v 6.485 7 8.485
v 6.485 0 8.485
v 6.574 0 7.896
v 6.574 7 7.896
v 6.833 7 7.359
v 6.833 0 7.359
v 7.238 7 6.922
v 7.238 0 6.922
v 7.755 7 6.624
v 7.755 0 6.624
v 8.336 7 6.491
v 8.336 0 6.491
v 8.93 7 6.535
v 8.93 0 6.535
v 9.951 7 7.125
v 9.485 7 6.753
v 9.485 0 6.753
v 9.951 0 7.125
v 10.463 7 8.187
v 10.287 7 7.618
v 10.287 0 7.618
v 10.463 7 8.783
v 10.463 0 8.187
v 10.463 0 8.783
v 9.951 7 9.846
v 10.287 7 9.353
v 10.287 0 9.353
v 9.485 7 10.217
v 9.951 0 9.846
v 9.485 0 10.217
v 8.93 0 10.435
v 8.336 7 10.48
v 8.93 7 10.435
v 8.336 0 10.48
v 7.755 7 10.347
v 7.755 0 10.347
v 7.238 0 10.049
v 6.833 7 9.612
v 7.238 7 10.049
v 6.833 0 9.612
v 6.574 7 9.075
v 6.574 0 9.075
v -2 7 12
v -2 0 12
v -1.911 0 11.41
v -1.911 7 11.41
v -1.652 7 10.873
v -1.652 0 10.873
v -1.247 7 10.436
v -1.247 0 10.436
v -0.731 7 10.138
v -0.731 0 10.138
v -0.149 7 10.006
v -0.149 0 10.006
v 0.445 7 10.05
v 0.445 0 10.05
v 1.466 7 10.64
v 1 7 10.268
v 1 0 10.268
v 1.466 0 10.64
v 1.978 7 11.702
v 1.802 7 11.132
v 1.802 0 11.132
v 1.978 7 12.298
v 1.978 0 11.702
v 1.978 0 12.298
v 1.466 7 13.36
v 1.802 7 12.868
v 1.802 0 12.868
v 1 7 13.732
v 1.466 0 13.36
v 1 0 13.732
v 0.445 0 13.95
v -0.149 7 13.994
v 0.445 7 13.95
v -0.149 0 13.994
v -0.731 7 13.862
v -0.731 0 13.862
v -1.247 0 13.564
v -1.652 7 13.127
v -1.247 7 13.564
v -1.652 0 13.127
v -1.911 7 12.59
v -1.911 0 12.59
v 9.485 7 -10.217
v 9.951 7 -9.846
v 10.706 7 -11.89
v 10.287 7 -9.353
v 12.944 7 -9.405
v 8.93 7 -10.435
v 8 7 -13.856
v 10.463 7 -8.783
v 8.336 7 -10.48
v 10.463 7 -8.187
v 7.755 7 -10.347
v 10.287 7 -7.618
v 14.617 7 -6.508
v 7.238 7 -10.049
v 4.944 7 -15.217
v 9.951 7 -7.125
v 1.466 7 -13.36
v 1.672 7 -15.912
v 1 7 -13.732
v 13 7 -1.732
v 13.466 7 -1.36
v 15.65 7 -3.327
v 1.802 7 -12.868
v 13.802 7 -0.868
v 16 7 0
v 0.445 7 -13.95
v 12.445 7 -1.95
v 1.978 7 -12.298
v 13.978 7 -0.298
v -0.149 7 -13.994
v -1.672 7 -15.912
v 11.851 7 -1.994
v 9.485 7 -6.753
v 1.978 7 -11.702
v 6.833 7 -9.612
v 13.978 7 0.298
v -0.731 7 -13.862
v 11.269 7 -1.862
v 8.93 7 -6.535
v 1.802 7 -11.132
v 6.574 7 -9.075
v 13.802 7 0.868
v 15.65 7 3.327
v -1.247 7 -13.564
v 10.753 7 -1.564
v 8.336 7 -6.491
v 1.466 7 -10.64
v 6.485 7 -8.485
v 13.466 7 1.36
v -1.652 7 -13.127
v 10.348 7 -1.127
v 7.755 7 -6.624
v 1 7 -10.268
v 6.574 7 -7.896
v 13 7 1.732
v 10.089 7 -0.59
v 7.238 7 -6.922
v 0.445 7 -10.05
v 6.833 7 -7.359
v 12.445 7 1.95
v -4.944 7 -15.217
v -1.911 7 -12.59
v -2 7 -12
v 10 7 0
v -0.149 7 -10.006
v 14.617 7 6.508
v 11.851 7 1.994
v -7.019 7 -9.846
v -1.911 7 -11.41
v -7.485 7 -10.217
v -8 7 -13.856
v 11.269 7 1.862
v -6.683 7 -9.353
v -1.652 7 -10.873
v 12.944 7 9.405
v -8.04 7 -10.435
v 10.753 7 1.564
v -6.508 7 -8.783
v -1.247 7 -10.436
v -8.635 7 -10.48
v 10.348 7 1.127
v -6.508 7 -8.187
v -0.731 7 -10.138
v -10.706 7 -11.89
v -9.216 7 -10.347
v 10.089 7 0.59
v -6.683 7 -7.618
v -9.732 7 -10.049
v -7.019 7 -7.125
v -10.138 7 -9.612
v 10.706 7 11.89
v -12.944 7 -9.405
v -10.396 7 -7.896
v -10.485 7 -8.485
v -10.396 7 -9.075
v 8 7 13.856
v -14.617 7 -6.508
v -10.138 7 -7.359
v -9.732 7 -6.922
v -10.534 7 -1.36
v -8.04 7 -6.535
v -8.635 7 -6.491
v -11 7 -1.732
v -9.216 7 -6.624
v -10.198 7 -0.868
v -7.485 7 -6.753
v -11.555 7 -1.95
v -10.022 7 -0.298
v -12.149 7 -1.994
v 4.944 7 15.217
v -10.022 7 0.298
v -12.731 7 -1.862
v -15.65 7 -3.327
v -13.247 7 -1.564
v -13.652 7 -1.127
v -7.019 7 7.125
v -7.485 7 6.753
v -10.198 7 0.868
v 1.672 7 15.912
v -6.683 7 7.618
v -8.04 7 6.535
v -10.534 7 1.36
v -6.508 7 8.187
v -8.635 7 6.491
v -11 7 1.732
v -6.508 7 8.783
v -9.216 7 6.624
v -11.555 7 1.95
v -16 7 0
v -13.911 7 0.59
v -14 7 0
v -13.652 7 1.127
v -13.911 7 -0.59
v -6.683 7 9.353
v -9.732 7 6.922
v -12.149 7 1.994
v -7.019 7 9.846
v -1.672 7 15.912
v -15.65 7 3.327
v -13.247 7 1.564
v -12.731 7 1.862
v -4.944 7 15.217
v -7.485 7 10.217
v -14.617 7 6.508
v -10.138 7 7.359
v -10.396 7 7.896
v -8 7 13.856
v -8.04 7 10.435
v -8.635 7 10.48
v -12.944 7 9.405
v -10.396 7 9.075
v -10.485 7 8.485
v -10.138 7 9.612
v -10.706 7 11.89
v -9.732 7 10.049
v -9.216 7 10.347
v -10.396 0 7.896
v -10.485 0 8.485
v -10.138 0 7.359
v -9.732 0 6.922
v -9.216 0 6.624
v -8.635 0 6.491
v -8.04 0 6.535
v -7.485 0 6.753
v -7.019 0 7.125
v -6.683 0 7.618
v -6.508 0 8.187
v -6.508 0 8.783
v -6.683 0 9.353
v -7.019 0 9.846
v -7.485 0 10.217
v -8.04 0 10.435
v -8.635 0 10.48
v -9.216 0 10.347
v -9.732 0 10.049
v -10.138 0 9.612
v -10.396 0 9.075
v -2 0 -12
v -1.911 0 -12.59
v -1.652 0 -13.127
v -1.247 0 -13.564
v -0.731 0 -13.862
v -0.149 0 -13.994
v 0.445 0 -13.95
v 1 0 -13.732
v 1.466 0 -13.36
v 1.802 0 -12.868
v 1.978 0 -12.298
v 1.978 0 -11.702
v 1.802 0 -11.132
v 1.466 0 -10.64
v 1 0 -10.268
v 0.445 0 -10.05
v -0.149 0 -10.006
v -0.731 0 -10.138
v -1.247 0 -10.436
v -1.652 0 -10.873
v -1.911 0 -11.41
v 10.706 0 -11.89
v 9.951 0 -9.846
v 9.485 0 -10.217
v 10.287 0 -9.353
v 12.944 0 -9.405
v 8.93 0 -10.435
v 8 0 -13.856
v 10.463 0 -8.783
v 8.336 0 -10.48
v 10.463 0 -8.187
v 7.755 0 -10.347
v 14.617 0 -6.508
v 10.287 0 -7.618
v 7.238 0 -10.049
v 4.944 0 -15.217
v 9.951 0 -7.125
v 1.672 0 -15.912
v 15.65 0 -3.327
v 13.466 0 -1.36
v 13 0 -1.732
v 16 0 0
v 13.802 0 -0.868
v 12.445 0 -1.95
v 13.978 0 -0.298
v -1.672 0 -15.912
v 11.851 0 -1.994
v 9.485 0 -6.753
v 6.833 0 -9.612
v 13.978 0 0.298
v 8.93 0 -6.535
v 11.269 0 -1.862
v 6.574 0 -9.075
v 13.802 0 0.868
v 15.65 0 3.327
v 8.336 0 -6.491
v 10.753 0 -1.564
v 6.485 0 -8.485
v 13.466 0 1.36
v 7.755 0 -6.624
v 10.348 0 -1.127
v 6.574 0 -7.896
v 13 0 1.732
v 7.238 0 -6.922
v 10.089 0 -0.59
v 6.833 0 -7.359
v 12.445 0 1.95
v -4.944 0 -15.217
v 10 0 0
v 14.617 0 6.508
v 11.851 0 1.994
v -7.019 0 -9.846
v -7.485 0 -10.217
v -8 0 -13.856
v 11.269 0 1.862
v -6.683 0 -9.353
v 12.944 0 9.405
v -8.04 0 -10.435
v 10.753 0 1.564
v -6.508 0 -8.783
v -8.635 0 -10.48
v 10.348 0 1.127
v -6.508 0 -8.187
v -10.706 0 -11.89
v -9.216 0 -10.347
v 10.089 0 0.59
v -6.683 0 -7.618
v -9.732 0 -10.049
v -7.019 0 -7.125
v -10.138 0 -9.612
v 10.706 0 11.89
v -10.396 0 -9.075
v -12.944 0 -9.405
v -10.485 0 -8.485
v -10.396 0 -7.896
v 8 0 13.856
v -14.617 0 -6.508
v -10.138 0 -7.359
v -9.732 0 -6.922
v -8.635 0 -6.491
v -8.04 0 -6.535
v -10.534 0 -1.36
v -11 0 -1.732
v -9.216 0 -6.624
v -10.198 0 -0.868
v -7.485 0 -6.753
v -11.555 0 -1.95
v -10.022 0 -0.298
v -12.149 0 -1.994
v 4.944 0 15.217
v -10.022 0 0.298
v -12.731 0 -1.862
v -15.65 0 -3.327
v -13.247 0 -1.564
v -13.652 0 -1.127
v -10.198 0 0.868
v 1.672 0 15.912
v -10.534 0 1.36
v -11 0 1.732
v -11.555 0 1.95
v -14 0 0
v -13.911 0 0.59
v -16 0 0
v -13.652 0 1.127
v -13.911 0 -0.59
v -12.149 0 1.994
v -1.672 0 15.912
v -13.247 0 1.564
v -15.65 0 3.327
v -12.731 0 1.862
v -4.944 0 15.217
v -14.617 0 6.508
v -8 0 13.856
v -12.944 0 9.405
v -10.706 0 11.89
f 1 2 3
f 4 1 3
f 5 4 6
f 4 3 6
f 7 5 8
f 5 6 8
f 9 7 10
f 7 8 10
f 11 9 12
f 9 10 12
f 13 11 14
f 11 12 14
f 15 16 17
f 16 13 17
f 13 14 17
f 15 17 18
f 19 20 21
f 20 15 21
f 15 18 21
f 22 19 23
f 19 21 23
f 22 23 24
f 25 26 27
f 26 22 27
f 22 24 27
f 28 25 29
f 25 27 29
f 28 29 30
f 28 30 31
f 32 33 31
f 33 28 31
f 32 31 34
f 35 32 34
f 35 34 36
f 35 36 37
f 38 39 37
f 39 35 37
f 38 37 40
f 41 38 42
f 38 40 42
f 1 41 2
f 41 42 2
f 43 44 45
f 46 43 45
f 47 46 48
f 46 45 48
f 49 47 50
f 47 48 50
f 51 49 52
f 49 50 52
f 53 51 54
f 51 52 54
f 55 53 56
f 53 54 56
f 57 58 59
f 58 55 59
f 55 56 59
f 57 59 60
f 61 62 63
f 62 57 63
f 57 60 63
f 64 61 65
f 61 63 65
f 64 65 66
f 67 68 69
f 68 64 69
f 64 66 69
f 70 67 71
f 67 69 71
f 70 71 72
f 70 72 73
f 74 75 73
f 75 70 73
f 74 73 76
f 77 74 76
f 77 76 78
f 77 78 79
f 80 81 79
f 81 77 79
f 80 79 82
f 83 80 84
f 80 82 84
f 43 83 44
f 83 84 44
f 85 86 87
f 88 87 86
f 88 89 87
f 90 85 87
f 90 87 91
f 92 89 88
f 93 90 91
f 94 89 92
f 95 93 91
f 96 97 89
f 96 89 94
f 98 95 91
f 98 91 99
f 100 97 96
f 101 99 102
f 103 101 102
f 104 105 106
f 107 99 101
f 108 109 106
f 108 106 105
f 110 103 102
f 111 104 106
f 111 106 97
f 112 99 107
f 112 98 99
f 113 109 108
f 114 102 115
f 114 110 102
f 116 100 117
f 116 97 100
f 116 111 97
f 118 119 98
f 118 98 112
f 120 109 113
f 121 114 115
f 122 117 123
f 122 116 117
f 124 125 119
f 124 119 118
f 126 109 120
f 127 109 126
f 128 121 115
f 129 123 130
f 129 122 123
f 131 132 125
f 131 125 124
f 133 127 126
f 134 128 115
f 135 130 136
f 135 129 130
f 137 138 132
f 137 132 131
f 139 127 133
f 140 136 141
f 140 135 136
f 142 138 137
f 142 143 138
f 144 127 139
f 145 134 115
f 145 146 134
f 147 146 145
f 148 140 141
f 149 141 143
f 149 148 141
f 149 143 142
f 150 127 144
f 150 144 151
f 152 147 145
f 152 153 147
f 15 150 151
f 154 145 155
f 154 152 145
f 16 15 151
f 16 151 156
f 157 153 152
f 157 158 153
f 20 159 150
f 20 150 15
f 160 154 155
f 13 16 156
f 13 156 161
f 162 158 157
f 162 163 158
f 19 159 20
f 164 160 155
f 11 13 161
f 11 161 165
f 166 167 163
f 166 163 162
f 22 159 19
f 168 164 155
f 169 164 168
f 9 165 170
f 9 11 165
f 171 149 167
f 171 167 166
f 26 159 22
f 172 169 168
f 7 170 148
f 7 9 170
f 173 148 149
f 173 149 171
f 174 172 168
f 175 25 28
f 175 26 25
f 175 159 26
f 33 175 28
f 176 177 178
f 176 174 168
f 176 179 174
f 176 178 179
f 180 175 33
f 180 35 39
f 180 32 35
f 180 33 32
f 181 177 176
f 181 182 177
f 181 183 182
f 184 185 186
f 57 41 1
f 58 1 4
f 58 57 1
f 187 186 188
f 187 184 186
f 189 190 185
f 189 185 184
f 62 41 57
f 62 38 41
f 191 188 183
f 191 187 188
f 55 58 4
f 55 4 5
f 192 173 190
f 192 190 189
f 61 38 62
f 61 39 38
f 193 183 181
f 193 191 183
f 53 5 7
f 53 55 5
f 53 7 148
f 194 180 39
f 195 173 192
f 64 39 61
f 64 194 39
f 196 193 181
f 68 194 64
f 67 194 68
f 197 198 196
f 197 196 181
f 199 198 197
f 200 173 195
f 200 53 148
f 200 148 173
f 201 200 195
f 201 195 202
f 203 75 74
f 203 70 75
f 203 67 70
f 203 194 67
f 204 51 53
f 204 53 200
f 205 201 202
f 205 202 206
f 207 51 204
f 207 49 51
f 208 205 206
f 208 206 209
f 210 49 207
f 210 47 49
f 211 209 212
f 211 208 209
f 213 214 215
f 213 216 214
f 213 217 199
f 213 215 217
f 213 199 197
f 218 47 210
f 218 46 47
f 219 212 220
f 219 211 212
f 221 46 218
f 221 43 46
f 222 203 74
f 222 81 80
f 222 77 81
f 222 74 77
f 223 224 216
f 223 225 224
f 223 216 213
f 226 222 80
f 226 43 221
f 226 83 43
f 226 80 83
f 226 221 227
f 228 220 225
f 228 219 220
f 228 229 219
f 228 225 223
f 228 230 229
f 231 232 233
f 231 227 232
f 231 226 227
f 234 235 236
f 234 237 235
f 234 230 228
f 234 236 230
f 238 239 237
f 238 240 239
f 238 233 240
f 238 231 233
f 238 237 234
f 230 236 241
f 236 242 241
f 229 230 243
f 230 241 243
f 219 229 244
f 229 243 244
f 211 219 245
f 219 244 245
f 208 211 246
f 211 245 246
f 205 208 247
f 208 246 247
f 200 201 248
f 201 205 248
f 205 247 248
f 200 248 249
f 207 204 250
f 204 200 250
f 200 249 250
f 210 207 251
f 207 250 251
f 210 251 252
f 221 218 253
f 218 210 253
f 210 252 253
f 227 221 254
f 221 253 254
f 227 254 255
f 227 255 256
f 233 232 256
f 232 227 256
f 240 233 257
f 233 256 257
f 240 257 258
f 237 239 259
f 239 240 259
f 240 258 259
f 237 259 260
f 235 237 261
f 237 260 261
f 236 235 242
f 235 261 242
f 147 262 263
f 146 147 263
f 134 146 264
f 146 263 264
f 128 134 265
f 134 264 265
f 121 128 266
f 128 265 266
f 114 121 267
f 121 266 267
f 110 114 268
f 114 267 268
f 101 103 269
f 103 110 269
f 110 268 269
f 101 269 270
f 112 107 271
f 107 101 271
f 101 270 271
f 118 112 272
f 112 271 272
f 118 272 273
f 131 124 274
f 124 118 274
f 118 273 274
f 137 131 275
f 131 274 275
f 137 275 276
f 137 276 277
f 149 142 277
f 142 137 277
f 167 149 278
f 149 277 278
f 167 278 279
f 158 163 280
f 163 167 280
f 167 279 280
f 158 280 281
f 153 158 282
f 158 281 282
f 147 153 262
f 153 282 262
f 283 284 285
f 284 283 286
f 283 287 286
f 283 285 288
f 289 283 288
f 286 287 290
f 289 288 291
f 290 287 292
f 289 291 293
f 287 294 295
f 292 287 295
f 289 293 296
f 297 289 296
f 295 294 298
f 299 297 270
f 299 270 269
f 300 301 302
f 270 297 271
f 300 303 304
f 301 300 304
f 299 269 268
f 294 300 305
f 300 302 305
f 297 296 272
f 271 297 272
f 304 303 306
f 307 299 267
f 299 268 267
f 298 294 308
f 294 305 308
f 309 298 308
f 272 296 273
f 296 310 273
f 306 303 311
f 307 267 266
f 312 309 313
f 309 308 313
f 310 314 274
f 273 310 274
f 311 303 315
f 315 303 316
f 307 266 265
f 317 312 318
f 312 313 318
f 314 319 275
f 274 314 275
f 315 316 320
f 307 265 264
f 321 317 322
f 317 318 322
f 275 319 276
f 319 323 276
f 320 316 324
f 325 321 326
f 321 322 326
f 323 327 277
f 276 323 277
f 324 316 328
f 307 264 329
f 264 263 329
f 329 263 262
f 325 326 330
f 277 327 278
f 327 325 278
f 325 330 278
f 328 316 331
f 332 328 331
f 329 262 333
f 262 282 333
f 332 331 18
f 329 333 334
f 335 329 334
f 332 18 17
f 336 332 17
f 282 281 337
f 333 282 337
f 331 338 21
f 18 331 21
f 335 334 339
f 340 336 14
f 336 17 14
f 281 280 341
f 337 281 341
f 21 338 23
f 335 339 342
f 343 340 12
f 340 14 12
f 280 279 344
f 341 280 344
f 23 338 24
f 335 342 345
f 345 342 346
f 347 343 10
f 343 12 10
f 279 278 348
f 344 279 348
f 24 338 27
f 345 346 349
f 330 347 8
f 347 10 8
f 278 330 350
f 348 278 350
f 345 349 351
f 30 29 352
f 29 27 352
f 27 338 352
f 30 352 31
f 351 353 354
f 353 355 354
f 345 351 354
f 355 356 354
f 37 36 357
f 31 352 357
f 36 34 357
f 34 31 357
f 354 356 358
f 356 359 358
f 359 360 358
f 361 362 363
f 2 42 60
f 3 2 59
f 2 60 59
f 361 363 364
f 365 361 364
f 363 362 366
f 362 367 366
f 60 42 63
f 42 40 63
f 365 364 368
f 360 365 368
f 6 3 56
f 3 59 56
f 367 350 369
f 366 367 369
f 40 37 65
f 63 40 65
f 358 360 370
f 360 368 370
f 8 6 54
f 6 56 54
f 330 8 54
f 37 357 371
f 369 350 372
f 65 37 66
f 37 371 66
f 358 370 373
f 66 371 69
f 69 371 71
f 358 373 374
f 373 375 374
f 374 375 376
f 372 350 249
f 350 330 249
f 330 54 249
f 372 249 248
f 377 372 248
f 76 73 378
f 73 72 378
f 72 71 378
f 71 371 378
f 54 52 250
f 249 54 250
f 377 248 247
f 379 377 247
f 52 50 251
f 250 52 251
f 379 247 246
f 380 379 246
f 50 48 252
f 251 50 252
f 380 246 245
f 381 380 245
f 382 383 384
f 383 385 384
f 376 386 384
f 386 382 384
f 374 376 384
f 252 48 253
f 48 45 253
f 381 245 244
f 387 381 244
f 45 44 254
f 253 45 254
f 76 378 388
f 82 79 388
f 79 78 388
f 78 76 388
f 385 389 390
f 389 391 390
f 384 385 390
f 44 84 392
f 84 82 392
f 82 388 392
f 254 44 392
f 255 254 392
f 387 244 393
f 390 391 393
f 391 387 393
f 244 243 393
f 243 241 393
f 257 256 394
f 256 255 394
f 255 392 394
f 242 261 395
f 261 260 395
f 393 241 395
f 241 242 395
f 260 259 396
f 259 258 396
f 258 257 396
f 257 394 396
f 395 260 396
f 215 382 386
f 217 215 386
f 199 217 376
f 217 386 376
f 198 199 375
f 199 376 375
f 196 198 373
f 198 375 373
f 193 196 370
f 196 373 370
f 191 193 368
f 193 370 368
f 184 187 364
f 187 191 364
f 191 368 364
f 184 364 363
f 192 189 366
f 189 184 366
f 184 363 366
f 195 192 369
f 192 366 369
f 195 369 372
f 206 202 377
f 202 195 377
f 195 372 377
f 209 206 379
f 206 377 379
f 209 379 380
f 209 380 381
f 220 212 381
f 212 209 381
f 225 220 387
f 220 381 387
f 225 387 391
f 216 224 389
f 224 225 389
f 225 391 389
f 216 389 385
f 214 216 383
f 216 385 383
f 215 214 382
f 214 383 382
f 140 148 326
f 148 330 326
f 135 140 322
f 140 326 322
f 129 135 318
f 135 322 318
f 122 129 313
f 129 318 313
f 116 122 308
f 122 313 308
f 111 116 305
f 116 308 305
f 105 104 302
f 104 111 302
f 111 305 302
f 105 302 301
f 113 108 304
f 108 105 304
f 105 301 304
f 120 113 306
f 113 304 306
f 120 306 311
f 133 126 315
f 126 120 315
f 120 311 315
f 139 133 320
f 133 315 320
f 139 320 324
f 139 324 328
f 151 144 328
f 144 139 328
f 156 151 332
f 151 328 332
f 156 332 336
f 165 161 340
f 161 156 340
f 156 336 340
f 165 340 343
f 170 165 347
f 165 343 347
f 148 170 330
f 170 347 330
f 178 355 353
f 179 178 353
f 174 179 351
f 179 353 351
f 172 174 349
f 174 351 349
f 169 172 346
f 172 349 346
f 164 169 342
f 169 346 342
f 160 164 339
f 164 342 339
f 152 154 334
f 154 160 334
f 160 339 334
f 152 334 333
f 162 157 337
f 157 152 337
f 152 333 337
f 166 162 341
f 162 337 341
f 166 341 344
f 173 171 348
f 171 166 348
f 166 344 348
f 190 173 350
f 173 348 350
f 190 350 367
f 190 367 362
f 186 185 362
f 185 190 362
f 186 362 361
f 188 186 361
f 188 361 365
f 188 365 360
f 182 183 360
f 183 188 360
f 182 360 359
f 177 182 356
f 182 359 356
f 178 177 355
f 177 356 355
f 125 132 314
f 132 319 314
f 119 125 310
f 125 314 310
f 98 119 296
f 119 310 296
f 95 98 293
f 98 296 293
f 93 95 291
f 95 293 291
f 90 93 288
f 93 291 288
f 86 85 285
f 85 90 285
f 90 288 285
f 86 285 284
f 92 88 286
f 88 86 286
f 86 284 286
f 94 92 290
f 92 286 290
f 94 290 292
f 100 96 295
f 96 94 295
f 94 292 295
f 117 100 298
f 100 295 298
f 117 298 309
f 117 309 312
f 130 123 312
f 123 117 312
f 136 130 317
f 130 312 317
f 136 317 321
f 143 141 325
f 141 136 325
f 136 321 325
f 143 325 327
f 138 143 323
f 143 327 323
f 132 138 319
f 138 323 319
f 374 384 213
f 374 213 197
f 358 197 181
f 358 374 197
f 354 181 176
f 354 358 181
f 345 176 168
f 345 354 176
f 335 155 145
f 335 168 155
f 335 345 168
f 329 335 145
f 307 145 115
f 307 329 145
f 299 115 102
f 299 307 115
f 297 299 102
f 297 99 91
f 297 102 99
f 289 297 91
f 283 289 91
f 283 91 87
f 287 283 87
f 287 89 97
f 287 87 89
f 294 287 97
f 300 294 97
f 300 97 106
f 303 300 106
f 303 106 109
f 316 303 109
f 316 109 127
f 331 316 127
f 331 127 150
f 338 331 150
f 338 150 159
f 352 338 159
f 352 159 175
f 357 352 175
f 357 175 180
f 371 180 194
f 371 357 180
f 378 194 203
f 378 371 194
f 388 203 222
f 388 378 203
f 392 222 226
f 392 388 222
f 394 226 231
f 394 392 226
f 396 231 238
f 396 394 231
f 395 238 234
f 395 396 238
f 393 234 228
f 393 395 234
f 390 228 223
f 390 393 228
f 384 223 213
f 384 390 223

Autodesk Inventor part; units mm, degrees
ref_plane "YZ Plane" through (0, 0, 0) normal (1, 0, 0) x (0, 1, 0)
ref_plane "XZ Plane" through (0, 0, 0) normal (0, 1, 0) x (-1, 0, 0)
ref_plane "XY Plane" through (0, 0, 0) normal (0, 0, 1) x (1, 0, 0)
sketch "Sketch1" plane through (0, 0, 0) normal (0, 1, 0) x (-1, 0, 0)
  circle A0 centre (0, 0) radius 16
  circle A1 centre (0, -12) radius 2
  circle A2 centre (8.4853, -8.4853) radius 2
  circle A3 centre (12, 0) radius 2
  circle A4 centre (8.4853, 8.4853) radius 2
  circle A5 centre (0, 12) radius 2
  circle A6 centre (-8.4853, 8.4853) radius 2
  circle A7 centre (-12, 0) radius 2
  circle A8 centre (-8.4853, -8.4853) radius 2
  dimension "d0" = 32
  dimension "d1" = 4
  dimension "d2" = 12
  dimension "d5" = 360
extrude "Extrusion1" add sketch "Sketch1" along normal blind 7
properties part number "ArmBearingSpacer2" material "Aluminum 6061"
